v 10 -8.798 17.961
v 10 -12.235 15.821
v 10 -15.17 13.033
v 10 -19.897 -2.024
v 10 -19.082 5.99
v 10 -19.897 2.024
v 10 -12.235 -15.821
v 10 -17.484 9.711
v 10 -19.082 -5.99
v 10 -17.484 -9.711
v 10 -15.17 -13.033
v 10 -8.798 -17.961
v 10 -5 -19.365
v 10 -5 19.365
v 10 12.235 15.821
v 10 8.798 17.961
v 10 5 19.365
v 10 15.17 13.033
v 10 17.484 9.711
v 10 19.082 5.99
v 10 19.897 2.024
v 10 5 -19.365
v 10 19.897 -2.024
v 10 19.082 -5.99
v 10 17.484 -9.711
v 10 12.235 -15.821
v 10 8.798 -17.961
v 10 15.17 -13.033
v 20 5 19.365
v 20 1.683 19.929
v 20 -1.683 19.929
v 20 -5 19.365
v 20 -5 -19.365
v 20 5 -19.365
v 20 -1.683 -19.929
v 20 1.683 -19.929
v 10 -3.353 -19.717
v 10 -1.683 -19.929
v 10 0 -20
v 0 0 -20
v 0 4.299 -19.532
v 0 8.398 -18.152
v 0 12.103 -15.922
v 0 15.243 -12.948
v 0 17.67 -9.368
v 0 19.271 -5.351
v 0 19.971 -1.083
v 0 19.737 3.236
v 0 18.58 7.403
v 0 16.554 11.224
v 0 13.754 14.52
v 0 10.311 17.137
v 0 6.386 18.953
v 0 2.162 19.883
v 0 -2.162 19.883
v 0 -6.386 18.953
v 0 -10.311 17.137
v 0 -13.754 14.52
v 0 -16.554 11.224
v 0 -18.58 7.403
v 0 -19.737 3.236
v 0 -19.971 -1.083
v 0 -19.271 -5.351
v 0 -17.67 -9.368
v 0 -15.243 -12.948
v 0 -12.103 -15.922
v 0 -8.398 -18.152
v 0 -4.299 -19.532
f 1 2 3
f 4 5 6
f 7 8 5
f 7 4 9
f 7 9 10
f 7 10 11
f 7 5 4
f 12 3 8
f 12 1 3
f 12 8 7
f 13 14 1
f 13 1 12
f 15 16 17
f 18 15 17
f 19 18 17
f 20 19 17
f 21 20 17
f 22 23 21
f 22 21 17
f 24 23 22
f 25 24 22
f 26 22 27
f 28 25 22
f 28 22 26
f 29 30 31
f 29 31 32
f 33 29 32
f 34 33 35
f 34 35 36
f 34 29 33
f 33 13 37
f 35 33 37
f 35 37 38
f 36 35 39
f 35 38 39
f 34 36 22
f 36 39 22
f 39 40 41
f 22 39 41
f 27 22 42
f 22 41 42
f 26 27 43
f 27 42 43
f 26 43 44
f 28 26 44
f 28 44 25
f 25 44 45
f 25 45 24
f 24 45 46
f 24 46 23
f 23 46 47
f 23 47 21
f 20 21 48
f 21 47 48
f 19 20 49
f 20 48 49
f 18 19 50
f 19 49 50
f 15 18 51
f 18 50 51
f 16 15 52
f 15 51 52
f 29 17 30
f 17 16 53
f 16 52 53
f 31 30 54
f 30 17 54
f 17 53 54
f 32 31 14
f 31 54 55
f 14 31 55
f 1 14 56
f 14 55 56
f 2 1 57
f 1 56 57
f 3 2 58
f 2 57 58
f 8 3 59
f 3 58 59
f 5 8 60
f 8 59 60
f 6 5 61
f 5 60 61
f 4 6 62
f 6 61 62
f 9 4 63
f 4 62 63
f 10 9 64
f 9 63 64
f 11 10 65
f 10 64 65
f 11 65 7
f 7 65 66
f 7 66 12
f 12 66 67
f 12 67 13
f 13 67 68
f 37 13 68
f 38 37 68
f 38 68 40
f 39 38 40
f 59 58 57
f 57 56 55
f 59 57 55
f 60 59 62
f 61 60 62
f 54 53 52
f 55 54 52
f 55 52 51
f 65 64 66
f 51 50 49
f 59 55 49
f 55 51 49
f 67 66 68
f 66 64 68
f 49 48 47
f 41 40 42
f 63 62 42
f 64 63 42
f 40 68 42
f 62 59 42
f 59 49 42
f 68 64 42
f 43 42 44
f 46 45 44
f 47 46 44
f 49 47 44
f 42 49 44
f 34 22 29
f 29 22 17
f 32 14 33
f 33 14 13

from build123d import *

# Parameters (mm, degrees)
SKETCH2_R           = 20
BOSS_EXTRUDE1_DEPTH = 10
BOSS_EXTRUDE2_DEPTH = 10


with BuildPart() as part:
    # Sketch2 → Boss-Extrude1 (new body)
    with BuildSketch(Plane(origin=(0, 0, 0), x_dir=(0, 0, -1), z_dir=(1, 0, 0))):
        Circle(SKETCH2_R)
    extrude(amount=BOSS_EXTRUDE1_DEPTH)

    # Sketch3 → Boss-Extrude2 (add)
    with BuildSketch(Plane(origin=(10, 0, 0), x_dir=(0, 0, -1), z_dir=(1, 0, 0))):
        with BuildLine():
            Line((19.364916731, 5), (-19.364916731, 5))
            ThreePointArc((-19.364916731, 5), (-20, 0), (-19.364916731, -5))
            Line((-19.364916731, -5), (19.364916731, -5))
            ThreePointArc((19.364916731, -5), (20, 0), (19.364916731, 5))
        make_face()
    extrude(amount=BOSS_EXTRUDE2_DEPTH)


solid = part.part
